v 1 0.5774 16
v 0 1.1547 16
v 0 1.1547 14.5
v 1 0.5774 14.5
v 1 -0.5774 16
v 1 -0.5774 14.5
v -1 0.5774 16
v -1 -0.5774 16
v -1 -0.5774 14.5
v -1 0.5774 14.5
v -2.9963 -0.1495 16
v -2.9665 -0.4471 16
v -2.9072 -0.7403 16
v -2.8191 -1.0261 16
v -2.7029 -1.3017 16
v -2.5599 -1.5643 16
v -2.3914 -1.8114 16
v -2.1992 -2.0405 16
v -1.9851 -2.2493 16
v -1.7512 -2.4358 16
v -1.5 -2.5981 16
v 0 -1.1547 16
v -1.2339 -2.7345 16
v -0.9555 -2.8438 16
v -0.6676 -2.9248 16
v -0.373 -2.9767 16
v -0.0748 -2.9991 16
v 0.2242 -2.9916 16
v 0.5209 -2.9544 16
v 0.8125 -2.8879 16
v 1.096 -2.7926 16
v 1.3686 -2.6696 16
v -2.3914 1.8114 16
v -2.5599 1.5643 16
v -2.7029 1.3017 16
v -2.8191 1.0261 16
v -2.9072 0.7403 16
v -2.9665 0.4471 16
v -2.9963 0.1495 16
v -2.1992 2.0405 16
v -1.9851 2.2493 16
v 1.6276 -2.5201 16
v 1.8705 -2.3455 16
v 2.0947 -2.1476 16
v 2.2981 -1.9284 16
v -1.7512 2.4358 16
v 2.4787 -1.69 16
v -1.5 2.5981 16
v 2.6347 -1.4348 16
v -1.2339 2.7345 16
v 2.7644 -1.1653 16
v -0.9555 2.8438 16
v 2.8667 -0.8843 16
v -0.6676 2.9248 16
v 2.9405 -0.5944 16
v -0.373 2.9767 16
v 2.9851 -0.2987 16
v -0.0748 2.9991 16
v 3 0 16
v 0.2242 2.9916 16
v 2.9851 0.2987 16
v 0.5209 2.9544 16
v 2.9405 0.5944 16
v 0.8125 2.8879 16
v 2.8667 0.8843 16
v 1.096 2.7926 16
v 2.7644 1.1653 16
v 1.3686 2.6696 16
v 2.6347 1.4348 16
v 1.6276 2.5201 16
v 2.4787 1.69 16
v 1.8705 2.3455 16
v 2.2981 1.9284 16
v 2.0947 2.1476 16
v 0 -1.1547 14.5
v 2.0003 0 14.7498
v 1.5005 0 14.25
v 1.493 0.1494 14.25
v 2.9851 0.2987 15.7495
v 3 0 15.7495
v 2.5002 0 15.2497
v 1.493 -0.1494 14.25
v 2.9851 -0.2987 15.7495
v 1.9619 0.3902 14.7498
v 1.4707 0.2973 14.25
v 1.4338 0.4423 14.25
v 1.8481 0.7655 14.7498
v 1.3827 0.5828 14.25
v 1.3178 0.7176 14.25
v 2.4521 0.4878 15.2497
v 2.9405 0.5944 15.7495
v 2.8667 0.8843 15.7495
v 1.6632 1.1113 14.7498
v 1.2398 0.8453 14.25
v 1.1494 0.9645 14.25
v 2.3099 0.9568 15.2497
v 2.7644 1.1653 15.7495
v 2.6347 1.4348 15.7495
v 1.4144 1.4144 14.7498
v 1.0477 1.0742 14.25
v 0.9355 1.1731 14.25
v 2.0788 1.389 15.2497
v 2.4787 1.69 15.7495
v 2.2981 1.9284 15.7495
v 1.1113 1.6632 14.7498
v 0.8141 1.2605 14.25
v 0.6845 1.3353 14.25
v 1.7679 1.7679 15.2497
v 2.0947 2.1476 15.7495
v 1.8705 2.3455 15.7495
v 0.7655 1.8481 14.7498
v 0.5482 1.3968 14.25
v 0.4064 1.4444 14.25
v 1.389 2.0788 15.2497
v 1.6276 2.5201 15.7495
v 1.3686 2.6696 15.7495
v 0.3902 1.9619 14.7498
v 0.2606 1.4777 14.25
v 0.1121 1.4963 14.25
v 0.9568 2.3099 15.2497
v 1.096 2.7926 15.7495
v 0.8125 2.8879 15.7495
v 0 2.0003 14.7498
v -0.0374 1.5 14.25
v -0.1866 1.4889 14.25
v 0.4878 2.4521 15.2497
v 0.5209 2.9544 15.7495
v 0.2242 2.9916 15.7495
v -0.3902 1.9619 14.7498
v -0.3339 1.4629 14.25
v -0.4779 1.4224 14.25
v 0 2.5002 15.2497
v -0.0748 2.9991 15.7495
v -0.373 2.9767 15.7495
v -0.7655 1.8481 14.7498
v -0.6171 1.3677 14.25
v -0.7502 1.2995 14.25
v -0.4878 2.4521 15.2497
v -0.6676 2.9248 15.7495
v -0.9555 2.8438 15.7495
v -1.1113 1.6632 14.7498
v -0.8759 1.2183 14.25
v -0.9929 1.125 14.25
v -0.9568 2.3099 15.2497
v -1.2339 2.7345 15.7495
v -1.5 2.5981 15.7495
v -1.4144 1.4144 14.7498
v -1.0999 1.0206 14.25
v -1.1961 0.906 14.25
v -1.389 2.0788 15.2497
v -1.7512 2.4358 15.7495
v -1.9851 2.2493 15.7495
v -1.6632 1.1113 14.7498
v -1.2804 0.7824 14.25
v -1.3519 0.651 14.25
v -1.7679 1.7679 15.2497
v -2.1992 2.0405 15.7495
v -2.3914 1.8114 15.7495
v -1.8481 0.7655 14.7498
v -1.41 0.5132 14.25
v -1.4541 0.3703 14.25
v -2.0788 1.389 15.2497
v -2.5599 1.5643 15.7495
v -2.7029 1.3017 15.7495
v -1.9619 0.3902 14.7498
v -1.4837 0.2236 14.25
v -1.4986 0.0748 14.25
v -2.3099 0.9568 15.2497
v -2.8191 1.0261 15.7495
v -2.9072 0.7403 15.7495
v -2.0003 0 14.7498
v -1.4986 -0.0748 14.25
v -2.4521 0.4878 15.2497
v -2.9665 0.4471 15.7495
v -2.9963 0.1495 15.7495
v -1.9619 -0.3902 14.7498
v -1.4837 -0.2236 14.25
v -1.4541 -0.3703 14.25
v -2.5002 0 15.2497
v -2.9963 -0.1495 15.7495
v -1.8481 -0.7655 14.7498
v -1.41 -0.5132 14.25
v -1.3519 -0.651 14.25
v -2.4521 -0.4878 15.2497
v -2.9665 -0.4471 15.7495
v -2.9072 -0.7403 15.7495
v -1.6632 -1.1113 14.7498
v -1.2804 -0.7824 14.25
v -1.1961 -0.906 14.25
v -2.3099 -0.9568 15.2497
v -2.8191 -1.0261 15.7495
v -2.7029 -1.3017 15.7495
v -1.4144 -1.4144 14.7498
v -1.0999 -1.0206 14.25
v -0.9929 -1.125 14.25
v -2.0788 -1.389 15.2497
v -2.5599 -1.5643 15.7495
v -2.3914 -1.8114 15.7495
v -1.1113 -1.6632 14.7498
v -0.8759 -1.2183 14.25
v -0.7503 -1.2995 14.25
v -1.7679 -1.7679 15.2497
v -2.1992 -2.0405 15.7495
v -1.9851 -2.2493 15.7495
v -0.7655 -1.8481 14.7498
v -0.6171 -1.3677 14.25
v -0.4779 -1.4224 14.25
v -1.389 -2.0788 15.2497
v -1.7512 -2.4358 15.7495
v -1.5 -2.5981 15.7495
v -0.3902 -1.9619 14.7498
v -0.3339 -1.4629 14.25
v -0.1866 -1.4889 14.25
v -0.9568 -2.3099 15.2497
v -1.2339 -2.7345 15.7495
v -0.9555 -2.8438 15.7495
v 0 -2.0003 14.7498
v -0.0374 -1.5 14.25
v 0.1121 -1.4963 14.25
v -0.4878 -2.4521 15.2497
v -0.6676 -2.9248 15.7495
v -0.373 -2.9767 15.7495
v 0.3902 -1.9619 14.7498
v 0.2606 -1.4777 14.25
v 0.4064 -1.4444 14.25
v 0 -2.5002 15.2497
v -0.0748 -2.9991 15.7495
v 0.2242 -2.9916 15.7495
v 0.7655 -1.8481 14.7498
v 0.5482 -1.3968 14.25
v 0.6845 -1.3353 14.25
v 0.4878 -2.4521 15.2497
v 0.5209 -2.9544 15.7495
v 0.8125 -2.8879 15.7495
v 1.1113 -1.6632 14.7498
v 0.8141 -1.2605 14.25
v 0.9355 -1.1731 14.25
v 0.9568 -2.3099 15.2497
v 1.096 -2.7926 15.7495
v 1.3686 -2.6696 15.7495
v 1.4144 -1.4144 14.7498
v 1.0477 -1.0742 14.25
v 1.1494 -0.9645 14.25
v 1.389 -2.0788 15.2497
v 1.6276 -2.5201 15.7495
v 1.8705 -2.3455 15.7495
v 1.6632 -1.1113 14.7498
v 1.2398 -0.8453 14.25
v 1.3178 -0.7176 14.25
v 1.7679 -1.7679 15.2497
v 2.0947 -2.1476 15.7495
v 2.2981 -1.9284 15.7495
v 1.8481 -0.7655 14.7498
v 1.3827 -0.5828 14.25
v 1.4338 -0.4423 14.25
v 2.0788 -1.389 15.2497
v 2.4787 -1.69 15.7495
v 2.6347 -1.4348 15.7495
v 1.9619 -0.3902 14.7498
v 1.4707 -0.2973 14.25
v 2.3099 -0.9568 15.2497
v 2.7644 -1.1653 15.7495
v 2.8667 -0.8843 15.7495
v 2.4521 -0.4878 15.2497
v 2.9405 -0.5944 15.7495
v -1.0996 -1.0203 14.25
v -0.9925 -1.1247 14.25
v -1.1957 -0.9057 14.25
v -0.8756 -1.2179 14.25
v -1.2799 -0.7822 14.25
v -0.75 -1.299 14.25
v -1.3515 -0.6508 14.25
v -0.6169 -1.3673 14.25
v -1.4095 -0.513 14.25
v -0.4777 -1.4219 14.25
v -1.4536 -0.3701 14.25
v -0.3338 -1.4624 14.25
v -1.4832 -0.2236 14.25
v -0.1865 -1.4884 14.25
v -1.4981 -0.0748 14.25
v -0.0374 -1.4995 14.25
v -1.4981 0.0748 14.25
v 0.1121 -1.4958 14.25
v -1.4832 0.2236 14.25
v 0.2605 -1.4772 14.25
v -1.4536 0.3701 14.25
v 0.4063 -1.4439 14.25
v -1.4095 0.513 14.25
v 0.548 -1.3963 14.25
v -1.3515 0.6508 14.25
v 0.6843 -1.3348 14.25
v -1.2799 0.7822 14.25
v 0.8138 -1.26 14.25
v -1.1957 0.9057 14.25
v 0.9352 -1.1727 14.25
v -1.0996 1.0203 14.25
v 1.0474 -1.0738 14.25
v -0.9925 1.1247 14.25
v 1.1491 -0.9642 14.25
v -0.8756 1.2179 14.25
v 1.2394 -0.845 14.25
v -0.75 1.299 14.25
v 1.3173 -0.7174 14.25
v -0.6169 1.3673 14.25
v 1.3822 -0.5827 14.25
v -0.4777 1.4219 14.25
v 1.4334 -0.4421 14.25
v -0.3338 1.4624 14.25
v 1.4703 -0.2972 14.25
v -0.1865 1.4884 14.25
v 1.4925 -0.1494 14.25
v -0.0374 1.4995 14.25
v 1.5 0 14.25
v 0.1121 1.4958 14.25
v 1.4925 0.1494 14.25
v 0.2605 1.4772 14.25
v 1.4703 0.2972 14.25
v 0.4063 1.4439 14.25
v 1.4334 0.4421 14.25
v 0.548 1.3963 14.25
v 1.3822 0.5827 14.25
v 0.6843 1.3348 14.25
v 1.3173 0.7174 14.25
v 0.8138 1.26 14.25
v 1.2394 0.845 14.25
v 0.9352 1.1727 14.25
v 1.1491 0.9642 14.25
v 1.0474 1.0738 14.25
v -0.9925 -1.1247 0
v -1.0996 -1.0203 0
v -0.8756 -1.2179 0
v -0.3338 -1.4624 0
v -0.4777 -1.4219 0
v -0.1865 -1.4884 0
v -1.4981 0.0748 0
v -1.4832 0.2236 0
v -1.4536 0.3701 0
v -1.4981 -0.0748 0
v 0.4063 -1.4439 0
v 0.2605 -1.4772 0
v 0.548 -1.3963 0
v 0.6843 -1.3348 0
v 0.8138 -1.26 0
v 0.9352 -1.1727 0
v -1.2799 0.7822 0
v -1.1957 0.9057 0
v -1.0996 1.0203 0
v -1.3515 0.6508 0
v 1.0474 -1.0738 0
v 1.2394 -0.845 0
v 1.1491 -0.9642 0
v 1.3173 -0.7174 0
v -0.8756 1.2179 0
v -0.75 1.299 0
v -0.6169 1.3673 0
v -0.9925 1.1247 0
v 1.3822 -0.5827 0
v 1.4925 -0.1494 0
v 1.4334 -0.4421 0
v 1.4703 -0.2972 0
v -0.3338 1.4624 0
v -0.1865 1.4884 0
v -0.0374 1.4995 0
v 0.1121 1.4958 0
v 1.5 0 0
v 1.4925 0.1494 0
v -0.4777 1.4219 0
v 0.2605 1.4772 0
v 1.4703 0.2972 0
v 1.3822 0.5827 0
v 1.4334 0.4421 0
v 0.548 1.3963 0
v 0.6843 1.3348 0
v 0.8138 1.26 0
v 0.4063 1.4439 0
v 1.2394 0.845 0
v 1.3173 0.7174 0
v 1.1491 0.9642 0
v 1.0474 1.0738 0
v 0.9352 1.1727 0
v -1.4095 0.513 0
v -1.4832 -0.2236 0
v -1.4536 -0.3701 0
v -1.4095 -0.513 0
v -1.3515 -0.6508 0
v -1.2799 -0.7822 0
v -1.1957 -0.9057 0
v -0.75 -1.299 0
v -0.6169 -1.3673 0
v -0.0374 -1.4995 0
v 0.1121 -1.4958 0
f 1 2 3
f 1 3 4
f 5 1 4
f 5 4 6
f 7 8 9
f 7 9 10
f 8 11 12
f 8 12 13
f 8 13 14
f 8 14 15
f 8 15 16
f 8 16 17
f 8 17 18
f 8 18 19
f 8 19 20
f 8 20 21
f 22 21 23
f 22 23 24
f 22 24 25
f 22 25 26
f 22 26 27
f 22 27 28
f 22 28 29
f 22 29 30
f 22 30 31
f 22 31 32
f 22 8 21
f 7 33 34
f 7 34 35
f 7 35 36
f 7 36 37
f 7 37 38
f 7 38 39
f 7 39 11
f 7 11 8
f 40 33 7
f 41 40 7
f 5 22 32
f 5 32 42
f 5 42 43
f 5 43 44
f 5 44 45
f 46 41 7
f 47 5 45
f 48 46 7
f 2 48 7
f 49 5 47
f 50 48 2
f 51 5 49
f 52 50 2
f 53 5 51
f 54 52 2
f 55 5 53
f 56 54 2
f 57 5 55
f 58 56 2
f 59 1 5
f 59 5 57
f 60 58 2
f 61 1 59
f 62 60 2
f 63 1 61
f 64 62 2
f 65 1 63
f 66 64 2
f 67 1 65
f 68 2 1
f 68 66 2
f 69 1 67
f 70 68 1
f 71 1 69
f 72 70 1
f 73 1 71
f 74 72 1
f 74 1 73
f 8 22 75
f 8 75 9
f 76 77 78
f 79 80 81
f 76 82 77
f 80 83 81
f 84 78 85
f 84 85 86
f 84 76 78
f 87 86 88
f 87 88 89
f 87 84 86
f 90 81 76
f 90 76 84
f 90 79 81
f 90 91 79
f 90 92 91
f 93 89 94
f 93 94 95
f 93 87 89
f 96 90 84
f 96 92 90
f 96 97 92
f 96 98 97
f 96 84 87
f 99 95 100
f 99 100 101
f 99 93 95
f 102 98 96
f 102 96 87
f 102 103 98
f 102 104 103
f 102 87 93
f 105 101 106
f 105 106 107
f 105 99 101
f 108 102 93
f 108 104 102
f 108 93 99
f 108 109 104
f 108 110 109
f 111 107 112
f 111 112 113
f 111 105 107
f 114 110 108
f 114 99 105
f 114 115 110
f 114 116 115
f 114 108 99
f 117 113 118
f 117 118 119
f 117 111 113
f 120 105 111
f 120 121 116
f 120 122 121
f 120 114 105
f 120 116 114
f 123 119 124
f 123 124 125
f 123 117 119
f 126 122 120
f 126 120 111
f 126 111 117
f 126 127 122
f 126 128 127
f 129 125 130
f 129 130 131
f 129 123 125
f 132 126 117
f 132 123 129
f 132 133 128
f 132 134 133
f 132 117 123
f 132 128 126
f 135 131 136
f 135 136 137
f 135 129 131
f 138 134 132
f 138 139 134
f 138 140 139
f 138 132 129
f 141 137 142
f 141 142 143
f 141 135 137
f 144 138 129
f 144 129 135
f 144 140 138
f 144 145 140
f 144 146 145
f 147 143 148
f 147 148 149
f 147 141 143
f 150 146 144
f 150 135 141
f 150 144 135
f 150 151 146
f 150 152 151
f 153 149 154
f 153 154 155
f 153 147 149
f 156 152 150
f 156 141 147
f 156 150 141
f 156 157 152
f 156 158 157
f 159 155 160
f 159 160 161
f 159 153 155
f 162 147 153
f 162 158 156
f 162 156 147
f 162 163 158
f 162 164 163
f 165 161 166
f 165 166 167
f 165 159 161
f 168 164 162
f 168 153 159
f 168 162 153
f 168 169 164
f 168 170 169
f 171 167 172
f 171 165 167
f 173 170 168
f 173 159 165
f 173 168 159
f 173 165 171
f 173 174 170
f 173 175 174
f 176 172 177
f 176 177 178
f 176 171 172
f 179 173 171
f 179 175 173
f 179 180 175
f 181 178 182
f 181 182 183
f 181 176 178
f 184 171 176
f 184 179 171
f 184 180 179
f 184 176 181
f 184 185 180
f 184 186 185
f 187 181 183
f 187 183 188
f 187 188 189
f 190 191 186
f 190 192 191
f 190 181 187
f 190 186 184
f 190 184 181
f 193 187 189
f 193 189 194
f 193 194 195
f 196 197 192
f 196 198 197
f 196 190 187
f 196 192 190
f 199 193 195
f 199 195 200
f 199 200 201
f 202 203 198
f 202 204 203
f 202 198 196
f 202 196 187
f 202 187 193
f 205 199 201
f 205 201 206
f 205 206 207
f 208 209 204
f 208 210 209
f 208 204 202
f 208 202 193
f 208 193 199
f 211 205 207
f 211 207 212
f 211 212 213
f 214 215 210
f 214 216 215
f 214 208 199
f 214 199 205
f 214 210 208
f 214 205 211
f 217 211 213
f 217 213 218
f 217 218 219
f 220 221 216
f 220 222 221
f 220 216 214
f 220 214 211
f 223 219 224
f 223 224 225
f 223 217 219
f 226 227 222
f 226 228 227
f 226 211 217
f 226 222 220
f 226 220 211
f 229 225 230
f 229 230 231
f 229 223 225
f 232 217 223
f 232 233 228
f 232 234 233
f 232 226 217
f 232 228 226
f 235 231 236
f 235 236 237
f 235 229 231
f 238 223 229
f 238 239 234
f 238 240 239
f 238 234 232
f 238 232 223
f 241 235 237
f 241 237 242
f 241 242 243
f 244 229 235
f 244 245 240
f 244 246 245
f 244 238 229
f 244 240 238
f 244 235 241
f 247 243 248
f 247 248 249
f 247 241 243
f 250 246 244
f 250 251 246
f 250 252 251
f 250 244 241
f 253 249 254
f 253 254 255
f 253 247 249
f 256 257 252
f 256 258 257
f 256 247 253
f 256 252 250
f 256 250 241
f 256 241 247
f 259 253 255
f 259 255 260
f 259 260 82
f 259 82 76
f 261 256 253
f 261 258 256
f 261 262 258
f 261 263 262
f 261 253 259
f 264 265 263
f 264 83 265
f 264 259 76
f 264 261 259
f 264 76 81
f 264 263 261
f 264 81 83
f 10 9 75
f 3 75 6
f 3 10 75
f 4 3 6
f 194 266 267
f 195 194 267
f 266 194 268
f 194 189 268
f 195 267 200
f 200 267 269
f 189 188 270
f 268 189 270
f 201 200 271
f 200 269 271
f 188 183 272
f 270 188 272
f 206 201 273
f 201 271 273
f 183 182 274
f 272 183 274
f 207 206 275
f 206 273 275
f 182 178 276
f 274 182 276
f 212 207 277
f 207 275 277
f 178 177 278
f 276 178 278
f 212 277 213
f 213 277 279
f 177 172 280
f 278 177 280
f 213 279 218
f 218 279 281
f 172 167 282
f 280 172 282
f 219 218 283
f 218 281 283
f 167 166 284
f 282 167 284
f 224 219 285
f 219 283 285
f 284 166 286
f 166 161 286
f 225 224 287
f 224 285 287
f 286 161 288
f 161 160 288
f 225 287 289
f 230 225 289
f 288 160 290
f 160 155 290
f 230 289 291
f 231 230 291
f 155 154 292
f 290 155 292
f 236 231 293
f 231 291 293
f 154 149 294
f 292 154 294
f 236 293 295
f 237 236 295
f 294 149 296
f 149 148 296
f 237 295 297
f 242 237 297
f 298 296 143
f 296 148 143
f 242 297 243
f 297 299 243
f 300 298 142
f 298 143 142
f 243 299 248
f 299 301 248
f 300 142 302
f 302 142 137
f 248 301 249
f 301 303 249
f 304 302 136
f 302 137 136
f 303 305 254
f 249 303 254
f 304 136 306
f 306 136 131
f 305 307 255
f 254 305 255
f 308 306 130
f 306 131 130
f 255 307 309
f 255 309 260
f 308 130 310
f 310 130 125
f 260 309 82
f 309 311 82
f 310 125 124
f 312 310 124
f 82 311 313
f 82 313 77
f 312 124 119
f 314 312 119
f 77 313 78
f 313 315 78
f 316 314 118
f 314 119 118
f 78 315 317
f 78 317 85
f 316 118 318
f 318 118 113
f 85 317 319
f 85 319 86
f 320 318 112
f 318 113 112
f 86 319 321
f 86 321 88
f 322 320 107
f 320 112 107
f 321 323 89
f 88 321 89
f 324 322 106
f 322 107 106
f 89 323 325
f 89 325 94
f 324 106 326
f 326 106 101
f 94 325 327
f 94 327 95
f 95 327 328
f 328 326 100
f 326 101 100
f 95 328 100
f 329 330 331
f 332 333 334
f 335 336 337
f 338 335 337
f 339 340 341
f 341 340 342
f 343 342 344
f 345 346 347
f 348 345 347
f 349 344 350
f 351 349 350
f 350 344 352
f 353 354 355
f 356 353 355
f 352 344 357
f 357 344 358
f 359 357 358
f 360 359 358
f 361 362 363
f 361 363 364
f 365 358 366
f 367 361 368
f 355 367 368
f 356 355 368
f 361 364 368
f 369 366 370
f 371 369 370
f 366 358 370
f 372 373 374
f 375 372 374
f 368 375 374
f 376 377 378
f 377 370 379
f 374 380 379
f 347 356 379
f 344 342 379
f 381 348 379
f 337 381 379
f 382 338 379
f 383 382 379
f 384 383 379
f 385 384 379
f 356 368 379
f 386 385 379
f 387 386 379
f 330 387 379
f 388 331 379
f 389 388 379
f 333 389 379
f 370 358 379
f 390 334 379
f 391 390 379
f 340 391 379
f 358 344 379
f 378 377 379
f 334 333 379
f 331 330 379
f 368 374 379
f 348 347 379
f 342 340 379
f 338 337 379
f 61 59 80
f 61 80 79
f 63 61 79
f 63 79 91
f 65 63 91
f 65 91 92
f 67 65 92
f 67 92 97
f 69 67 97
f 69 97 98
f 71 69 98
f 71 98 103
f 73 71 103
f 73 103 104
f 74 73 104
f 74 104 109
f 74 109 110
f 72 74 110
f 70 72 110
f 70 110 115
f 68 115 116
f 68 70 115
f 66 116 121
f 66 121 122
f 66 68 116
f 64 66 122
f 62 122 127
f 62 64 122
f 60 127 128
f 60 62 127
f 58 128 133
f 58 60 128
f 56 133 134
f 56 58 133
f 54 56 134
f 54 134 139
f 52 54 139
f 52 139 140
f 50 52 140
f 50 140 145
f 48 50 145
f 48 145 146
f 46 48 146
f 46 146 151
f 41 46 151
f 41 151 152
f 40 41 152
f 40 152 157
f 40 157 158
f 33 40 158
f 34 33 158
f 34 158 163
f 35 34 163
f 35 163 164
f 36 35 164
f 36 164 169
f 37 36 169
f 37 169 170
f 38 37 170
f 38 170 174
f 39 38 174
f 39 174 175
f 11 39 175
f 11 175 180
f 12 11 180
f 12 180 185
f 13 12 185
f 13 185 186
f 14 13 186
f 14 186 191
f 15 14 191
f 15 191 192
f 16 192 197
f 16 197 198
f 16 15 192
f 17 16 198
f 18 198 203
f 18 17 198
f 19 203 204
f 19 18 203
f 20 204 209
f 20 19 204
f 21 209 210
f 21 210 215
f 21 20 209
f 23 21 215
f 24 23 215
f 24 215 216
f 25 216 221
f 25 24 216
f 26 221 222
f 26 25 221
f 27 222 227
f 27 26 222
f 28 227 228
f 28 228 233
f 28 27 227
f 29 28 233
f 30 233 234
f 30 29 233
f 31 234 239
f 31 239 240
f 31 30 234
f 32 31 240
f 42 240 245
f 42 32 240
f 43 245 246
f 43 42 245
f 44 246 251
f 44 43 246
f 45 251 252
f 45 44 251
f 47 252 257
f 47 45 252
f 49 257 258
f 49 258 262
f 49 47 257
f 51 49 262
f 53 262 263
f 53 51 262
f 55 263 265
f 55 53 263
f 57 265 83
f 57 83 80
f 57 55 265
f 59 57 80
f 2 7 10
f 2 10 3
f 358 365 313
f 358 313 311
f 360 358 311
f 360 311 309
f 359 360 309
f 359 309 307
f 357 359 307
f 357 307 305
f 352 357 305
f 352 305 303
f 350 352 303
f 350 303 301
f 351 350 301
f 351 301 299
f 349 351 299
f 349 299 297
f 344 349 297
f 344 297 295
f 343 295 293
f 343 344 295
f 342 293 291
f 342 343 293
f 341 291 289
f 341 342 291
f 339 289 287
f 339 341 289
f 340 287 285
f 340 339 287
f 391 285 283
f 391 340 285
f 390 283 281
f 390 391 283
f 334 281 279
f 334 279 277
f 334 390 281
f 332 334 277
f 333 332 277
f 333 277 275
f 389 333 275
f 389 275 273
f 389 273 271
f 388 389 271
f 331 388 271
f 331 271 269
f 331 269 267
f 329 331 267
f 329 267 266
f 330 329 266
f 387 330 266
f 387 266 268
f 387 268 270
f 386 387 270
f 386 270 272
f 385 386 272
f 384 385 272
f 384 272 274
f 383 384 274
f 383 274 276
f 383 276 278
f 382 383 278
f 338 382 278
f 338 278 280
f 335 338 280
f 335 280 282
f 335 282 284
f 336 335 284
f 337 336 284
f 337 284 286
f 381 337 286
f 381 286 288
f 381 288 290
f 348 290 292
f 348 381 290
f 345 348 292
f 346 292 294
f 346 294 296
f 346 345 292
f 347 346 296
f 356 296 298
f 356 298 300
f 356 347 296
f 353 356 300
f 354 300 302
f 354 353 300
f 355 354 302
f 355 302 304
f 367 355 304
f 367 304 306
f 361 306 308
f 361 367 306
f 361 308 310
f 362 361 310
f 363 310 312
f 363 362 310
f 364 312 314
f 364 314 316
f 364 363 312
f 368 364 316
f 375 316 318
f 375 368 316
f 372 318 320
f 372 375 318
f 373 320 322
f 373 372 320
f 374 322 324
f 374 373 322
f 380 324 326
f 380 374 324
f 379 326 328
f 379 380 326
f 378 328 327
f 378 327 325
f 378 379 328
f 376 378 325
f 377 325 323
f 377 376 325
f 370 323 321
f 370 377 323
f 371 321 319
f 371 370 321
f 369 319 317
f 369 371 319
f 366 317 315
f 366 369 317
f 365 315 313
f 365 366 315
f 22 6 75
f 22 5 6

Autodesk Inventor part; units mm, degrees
ref_plane "YZ Plane" through (0, 0, 0) normal (1, 0, 0) x (0, 1, 0)
ref_plane "XZ Plane" through (0, 0, 0) normal (0, 1, 0) x (-1, 0, 0)
ref_plane "XY Plane" through (0, 0, 0) normal (0, 0, 1) x (1, 0, 0)
sketch "スケッチ1" plane through (0, 0, 0) normal (0, 0, 1) x (1, 0, 0)
  circle A0 centre (0, 0) radius 1.5
  dimension "d0" = 3
extrude "押し出し1" add sketch "スケッチ1" along normal blind 16
thread "ねじ1" size "M3x0.5" class "6g" standard "ANSI Metric M Profile" full length
sketch "スケッチ2" plane through (0, 0, 16) normal (0, 0, 1) x (1, 0, 0)
  circle A0 centre (0, 0) radius 3
  dimension "d5" = 6
extrude "押し出し2" add sketch "スケッチ2" against normal blind 1.75
chamfer "面取り1" distance 1.5 angle 45 1 edges at (-3, 0, 14.25)
sketch "スケッチ3" plane through (0, 0, 16) normal (0, 0, 1) x (1, 0, 0)
  line L0 (0, 1.1547) -> (1, 0.5774)
  line L1 (1, 0.5774) -> (1, -0.5774)
  line L2 (1, -0.5774) -> (0, -1.1547)
  line L3 (0, -1.1547) -> (-1, -0.5774)
  line L4 (-1, -0.5774) -> (-1, 0.5774)
  line L5 (-1, 0.5774) -> (0, 1.1547)
  point P0 (0, 0)
  point P1 (0, 0)
  dimension "d11" = 2
extrude "押し出し3" cut sketch "スケッチ3" against normal blind 1.5
properties part number "m3皿ネジ16" material "鉄 灰色"
